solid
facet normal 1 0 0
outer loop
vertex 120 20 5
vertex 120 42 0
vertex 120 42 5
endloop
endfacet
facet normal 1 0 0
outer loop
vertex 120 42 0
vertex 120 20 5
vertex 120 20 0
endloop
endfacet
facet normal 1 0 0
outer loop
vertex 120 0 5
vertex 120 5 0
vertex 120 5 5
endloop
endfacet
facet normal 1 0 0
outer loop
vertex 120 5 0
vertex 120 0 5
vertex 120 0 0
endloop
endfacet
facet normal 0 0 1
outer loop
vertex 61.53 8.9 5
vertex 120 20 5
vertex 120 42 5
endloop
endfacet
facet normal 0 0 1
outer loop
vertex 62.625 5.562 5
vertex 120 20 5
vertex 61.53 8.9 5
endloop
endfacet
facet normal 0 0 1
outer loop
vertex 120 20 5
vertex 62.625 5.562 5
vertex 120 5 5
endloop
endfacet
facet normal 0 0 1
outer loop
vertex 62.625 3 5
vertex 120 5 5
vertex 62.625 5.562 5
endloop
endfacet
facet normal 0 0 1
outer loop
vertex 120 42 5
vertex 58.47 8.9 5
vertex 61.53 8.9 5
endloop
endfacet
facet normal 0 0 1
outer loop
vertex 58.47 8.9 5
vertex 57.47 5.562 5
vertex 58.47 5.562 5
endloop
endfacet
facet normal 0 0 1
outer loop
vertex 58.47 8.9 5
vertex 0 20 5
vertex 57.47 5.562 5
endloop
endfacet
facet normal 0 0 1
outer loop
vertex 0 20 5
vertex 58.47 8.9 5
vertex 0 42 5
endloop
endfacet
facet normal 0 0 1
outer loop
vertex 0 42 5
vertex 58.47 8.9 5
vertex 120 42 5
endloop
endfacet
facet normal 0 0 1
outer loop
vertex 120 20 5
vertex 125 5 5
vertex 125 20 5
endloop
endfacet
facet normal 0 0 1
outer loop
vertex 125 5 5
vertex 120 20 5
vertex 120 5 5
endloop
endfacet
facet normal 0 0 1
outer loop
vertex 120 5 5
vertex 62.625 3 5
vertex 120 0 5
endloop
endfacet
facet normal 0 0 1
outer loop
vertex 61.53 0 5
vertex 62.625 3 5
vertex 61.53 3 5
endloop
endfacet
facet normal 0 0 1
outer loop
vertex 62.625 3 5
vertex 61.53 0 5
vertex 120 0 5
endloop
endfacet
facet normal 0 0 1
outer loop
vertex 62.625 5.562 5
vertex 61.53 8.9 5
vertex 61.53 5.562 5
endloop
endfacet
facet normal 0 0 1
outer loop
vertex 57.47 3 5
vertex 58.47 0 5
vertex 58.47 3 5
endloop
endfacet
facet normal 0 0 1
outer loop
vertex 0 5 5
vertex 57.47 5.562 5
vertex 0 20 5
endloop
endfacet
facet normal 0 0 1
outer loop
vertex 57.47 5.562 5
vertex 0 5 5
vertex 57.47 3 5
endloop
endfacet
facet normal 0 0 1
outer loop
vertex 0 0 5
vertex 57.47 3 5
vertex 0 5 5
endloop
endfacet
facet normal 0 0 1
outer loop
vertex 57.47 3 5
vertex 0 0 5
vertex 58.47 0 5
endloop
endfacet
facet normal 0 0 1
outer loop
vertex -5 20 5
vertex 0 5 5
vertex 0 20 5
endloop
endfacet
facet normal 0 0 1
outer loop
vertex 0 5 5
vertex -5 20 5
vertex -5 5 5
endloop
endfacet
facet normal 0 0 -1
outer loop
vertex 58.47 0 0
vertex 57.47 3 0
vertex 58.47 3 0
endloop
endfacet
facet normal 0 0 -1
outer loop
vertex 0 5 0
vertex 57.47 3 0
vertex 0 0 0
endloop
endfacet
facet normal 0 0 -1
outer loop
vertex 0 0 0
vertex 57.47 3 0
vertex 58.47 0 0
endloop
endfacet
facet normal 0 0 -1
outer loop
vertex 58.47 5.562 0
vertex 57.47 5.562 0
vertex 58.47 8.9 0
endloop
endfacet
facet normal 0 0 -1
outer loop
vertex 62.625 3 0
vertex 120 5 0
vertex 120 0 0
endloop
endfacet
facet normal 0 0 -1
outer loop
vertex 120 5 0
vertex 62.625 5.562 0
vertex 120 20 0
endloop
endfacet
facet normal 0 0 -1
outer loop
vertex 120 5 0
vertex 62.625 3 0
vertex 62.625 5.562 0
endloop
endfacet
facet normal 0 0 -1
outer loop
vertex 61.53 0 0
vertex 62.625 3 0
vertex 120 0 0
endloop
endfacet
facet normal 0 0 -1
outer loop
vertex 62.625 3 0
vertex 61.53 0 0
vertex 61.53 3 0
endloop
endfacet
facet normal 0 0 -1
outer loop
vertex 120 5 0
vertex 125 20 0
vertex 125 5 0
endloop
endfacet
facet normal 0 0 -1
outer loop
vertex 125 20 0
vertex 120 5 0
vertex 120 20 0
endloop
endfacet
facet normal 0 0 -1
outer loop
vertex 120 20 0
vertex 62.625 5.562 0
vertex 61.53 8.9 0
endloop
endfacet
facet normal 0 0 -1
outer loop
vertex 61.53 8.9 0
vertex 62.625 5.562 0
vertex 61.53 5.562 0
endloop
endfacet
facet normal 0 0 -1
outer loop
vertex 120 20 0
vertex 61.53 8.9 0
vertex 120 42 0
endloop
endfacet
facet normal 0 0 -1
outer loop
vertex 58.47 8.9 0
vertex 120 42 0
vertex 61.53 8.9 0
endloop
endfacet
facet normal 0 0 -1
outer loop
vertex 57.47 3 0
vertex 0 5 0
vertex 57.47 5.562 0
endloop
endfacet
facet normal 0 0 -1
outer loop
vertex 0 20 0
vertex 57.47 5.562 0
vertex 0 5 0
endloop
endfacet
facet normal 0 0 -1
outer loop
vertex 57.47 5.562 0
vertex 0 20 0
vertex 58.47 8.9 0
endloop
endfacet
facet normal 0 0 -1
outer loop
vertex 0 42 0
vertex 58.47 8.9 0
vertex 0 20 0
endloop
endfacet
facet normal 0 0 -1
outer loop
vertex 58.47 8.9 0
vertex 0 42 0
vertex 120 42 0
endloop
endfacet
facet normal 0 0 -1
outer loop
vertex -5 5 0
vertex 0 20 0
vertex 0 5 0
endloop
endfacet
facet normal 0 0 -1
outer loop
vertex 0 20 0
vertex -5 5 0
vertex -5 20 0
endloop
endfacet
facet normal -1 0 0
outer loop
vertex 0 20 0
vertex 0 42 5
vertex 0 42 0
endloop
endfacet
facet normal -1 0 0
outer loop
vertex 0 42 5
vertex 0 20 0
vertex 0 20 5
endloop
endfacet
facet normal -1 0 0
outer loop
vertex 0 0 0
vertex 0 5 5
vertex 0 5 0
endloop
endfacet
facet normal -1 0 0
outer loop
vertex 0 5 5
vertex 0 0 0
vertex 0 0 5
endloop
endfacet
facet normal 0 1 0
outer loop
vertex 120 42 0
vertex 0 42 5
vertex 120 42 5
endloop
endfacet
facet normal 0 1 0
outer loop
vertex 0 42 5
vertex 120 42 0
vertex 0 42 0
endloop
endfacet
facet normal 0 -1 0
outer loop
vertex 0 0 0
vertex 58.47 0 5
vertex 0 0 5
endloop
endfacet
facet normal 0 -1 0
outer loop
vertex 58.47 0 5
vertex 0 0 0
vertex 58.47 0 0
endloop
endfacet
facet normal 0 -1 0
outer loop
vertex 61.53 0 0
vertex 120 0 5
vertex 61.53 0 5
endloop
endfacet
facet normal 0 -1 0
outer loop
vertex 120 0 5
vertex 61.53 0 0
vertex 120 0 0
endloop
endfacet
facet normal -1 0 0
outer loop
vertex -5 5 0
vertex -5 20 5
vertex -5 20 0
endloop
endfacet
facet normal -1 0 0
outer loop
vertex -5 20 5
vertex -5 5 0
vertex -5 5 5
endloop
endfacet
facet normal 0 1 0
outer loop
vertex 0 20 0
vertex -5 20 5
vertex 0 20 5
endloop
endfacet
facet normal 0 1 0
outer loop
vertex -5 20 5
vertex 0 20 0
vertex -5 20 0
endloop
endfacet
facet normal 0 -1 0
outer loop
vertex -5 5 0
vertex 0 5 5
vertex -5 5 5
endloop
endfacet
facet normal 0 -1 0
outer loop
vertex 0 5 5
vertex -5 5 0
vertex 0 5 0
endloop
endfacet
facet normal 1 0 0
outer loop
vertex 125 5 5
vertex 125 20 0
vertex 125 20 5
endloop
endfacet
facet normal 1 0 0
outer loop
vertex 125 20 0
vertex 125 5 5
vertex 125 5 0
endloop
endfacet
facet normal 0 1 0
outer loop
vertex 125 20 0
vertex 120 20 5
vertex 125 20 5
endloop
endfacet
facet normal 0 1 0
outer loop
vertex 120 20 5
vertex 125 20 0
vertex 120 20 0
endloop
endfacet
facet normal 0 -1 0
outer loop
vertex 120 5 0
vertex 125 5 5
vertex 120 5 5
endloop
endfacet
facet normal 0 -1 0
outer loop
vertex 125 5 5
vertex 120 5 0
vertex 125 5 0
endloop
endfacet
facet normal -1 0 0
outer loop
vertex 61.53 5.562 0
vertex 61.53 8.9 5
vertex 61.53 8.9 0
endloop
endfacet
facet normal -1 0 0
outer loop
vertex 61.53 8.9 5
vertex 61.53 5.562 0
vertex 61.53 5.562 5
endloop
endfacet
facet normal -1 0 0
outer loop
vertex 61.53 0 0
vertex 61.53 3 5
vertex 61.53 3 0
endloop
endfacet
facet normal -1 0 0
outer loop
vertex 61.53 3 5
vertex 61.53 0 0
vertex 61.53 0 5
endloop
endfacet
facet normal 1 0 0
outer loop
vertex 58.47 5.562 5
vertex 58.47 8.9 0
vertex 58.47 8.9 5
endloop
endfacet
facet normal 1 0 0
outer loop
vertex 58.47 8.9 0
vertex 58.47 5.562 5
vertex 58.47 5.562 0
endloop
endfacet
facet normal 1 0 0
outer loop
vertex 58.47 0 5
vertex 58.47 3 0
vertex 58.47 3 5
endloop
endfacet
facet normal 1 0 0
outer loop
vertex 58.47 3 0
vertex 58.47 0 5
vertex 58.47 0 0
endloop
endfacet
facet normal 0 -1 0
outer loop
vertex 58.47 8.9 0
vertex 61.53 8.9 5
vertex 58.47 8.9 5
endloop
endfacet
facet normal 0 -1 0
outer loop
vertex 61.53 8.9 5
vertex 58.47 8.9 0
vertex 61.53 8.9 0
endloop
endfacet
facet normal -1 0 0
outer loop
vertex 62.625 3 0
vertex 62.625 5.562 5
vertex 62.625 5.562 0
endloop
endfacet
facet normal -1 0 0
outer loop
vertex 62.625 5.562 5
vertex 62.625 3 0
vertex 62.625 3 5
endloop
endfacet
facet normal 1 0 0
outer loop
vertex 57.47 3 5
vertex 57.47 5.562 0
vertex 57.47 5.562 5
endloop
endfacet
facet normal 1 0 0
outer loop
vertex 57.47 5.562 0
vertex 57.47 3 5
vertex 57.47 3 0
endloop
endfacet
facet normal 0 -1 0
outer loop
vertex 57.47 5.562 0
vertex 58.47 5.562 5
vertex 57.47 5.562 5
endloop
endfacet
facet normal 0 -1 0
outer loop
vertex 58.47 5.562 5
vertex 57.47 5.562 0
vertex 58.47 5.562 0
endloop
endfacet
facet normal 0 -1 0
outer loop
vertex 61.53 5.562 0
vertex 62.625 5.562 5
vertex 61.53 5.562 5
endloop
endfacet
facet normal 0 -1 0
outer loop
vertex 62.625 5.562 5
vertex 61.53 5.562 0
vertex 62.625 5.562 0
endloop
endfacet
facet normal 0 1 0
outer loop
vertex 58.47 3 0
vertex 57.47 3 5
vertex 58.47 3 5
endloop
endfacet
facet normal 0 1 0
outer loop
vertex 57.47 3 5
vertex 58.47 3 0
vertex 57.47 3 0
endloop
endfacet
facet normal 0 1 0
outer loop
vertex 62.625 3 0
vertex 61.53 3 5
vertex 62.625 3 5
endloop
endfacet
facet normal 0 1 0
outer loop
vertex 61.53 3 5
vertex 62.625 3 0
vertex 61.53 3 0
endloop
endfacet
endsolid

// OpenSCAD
// file: m3_captive_nut_slot.scad
$fn = 64;

include <dimensions.scad>;

module m3_captive_nut_slot() {
    translate([0, -0.1, -panel_thickness]) {
        cube([
            m3_bolt_slot_dia,
            m3_bolt_slot_len,
            panel_thickness * 3
        ]);
    }
    translate([-1, m3_bolt_slot_len / 3, -panel_thickness])
        cube([
            m3_nut_slot_width,
            m3_nut_slot_depth, 
            panel_thickness * 3
        ]);
}


m3_captive_nut_slot();
// file: dimensions.scad
panel_thickness = 5;

bezel_width = 140;
bezel_height = 85;
bezel_corner_radius = 3;
bezel_screw_hole_dia = 3.5;
bezel_angle = 70; // degrees

tab_tolerance_coeff = 1.025;
tab_width = 15;

floor_width = bezel_width - (panel_thickness * 4);
floor_depth = 120;
floor_height_above_bottom = 10; 

sma_bulkhead_radius = 3.25;
sma_bulkhead_flat_radius = 3;

roof_width = 100;
roof_depth = 80;
roof_height_below_top = 5; 

side_height = 100;
side_depth  = floor_depth;
side_corner_radius = 1.5;
chin_depth = 42;


// Pi standoff holes
// All measurements taken from https://www.raspberrypi.org/documentation/hardware/raspberrypi/mechanical/rpi_MECH_3bplus.pdf
// Top left etc relative to drawing
// 0,0 of drawing is bottom left corner

pi_width = 85;
pi_depth = 56;
pi_hole_dia = 2.75;
pi_hole_radius = pi_hole_dia / 2;
standoff_dia = pi_hole_dia * 2;
standoff_radius = standoff_dia / 2;
standoff_height = 3;
pi_standoff_holes = [
    [3.5, 3.5],           // bottom left
    [3.5+58, 3.5],      // bottom right
    [3.5, 3.5+49],      // top left
    [3.5+58, 3.5+49], // top right
];


m3_bolt_thread_len = 8;
m3_bolt_dia = 3;
m3_bolt_clearance_coeff = 1.02;
m3_bolt_slot_dia = m3_bolt_dia * m3_bolt_clearance_coeff;
m3_bolt_slot_len = m3_bolt_thread_len + 1;
m3_nut_flats_dia = 5.5;
m3_nut_clearance_coeff = 1.025;
m3_nut_points_dia = 6;
m3_nut_depth = 2.5;
m3_nut_slot_width = ((m3_nut_flats_dia * m3_nut_clearance_coeff) - m3_bolt_slot_dia) * 2;
m3_nut_slot_depth = m3_nut_depth * m3_nut_clearance_coeff;
   
// main file
include <dimensions.scad>;
use <m3_captive_nut_slot.scad>;

module chin_plate() {
    difference() {
        union() {
            cube([floor_width, chin_depth, panel_thickness]);
            translate([-panel_thickness, panel_thickness, 0])
                cube([panel_thickness, tab_width, panel_thickness]);
            translate([floor_width, panel_thickness, 0])
                cube([panel_thickness, tab_width, panel_thickness]);
        }
        translate([(floor_width/2)-(m3_bolt_slot_dia/2),0,0]) m3_captive_nut_slot();
    }
}

chin_plate();
